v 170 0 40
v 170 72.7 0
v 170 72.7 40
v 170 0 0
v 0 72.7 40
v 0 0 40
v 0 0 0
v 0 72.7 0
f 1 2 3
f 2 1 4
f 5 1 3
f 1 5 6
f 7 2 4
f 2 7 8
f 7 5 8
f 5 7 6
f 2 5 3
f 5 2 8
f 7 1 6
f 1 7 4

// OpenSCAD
// stand for fillerment spools
// 
// 01.10.2025 Sebastian Weigl
 
// set the fregment sizes
$fn = $preview ? 48 : 64;

// vars
border=2.5;

fir_box_width=170;
fir_box_depth=72.7;
fir_box_height=40;

spool_rad=110;

// object
difference() {
cube([fir_box_width,fir_box_depth,fir_box_height],false);
rotate([90,0,0])
translate([fir_box_width/2,115,-85])
#cylinder(r=spool_rad,h=100,true);
}
